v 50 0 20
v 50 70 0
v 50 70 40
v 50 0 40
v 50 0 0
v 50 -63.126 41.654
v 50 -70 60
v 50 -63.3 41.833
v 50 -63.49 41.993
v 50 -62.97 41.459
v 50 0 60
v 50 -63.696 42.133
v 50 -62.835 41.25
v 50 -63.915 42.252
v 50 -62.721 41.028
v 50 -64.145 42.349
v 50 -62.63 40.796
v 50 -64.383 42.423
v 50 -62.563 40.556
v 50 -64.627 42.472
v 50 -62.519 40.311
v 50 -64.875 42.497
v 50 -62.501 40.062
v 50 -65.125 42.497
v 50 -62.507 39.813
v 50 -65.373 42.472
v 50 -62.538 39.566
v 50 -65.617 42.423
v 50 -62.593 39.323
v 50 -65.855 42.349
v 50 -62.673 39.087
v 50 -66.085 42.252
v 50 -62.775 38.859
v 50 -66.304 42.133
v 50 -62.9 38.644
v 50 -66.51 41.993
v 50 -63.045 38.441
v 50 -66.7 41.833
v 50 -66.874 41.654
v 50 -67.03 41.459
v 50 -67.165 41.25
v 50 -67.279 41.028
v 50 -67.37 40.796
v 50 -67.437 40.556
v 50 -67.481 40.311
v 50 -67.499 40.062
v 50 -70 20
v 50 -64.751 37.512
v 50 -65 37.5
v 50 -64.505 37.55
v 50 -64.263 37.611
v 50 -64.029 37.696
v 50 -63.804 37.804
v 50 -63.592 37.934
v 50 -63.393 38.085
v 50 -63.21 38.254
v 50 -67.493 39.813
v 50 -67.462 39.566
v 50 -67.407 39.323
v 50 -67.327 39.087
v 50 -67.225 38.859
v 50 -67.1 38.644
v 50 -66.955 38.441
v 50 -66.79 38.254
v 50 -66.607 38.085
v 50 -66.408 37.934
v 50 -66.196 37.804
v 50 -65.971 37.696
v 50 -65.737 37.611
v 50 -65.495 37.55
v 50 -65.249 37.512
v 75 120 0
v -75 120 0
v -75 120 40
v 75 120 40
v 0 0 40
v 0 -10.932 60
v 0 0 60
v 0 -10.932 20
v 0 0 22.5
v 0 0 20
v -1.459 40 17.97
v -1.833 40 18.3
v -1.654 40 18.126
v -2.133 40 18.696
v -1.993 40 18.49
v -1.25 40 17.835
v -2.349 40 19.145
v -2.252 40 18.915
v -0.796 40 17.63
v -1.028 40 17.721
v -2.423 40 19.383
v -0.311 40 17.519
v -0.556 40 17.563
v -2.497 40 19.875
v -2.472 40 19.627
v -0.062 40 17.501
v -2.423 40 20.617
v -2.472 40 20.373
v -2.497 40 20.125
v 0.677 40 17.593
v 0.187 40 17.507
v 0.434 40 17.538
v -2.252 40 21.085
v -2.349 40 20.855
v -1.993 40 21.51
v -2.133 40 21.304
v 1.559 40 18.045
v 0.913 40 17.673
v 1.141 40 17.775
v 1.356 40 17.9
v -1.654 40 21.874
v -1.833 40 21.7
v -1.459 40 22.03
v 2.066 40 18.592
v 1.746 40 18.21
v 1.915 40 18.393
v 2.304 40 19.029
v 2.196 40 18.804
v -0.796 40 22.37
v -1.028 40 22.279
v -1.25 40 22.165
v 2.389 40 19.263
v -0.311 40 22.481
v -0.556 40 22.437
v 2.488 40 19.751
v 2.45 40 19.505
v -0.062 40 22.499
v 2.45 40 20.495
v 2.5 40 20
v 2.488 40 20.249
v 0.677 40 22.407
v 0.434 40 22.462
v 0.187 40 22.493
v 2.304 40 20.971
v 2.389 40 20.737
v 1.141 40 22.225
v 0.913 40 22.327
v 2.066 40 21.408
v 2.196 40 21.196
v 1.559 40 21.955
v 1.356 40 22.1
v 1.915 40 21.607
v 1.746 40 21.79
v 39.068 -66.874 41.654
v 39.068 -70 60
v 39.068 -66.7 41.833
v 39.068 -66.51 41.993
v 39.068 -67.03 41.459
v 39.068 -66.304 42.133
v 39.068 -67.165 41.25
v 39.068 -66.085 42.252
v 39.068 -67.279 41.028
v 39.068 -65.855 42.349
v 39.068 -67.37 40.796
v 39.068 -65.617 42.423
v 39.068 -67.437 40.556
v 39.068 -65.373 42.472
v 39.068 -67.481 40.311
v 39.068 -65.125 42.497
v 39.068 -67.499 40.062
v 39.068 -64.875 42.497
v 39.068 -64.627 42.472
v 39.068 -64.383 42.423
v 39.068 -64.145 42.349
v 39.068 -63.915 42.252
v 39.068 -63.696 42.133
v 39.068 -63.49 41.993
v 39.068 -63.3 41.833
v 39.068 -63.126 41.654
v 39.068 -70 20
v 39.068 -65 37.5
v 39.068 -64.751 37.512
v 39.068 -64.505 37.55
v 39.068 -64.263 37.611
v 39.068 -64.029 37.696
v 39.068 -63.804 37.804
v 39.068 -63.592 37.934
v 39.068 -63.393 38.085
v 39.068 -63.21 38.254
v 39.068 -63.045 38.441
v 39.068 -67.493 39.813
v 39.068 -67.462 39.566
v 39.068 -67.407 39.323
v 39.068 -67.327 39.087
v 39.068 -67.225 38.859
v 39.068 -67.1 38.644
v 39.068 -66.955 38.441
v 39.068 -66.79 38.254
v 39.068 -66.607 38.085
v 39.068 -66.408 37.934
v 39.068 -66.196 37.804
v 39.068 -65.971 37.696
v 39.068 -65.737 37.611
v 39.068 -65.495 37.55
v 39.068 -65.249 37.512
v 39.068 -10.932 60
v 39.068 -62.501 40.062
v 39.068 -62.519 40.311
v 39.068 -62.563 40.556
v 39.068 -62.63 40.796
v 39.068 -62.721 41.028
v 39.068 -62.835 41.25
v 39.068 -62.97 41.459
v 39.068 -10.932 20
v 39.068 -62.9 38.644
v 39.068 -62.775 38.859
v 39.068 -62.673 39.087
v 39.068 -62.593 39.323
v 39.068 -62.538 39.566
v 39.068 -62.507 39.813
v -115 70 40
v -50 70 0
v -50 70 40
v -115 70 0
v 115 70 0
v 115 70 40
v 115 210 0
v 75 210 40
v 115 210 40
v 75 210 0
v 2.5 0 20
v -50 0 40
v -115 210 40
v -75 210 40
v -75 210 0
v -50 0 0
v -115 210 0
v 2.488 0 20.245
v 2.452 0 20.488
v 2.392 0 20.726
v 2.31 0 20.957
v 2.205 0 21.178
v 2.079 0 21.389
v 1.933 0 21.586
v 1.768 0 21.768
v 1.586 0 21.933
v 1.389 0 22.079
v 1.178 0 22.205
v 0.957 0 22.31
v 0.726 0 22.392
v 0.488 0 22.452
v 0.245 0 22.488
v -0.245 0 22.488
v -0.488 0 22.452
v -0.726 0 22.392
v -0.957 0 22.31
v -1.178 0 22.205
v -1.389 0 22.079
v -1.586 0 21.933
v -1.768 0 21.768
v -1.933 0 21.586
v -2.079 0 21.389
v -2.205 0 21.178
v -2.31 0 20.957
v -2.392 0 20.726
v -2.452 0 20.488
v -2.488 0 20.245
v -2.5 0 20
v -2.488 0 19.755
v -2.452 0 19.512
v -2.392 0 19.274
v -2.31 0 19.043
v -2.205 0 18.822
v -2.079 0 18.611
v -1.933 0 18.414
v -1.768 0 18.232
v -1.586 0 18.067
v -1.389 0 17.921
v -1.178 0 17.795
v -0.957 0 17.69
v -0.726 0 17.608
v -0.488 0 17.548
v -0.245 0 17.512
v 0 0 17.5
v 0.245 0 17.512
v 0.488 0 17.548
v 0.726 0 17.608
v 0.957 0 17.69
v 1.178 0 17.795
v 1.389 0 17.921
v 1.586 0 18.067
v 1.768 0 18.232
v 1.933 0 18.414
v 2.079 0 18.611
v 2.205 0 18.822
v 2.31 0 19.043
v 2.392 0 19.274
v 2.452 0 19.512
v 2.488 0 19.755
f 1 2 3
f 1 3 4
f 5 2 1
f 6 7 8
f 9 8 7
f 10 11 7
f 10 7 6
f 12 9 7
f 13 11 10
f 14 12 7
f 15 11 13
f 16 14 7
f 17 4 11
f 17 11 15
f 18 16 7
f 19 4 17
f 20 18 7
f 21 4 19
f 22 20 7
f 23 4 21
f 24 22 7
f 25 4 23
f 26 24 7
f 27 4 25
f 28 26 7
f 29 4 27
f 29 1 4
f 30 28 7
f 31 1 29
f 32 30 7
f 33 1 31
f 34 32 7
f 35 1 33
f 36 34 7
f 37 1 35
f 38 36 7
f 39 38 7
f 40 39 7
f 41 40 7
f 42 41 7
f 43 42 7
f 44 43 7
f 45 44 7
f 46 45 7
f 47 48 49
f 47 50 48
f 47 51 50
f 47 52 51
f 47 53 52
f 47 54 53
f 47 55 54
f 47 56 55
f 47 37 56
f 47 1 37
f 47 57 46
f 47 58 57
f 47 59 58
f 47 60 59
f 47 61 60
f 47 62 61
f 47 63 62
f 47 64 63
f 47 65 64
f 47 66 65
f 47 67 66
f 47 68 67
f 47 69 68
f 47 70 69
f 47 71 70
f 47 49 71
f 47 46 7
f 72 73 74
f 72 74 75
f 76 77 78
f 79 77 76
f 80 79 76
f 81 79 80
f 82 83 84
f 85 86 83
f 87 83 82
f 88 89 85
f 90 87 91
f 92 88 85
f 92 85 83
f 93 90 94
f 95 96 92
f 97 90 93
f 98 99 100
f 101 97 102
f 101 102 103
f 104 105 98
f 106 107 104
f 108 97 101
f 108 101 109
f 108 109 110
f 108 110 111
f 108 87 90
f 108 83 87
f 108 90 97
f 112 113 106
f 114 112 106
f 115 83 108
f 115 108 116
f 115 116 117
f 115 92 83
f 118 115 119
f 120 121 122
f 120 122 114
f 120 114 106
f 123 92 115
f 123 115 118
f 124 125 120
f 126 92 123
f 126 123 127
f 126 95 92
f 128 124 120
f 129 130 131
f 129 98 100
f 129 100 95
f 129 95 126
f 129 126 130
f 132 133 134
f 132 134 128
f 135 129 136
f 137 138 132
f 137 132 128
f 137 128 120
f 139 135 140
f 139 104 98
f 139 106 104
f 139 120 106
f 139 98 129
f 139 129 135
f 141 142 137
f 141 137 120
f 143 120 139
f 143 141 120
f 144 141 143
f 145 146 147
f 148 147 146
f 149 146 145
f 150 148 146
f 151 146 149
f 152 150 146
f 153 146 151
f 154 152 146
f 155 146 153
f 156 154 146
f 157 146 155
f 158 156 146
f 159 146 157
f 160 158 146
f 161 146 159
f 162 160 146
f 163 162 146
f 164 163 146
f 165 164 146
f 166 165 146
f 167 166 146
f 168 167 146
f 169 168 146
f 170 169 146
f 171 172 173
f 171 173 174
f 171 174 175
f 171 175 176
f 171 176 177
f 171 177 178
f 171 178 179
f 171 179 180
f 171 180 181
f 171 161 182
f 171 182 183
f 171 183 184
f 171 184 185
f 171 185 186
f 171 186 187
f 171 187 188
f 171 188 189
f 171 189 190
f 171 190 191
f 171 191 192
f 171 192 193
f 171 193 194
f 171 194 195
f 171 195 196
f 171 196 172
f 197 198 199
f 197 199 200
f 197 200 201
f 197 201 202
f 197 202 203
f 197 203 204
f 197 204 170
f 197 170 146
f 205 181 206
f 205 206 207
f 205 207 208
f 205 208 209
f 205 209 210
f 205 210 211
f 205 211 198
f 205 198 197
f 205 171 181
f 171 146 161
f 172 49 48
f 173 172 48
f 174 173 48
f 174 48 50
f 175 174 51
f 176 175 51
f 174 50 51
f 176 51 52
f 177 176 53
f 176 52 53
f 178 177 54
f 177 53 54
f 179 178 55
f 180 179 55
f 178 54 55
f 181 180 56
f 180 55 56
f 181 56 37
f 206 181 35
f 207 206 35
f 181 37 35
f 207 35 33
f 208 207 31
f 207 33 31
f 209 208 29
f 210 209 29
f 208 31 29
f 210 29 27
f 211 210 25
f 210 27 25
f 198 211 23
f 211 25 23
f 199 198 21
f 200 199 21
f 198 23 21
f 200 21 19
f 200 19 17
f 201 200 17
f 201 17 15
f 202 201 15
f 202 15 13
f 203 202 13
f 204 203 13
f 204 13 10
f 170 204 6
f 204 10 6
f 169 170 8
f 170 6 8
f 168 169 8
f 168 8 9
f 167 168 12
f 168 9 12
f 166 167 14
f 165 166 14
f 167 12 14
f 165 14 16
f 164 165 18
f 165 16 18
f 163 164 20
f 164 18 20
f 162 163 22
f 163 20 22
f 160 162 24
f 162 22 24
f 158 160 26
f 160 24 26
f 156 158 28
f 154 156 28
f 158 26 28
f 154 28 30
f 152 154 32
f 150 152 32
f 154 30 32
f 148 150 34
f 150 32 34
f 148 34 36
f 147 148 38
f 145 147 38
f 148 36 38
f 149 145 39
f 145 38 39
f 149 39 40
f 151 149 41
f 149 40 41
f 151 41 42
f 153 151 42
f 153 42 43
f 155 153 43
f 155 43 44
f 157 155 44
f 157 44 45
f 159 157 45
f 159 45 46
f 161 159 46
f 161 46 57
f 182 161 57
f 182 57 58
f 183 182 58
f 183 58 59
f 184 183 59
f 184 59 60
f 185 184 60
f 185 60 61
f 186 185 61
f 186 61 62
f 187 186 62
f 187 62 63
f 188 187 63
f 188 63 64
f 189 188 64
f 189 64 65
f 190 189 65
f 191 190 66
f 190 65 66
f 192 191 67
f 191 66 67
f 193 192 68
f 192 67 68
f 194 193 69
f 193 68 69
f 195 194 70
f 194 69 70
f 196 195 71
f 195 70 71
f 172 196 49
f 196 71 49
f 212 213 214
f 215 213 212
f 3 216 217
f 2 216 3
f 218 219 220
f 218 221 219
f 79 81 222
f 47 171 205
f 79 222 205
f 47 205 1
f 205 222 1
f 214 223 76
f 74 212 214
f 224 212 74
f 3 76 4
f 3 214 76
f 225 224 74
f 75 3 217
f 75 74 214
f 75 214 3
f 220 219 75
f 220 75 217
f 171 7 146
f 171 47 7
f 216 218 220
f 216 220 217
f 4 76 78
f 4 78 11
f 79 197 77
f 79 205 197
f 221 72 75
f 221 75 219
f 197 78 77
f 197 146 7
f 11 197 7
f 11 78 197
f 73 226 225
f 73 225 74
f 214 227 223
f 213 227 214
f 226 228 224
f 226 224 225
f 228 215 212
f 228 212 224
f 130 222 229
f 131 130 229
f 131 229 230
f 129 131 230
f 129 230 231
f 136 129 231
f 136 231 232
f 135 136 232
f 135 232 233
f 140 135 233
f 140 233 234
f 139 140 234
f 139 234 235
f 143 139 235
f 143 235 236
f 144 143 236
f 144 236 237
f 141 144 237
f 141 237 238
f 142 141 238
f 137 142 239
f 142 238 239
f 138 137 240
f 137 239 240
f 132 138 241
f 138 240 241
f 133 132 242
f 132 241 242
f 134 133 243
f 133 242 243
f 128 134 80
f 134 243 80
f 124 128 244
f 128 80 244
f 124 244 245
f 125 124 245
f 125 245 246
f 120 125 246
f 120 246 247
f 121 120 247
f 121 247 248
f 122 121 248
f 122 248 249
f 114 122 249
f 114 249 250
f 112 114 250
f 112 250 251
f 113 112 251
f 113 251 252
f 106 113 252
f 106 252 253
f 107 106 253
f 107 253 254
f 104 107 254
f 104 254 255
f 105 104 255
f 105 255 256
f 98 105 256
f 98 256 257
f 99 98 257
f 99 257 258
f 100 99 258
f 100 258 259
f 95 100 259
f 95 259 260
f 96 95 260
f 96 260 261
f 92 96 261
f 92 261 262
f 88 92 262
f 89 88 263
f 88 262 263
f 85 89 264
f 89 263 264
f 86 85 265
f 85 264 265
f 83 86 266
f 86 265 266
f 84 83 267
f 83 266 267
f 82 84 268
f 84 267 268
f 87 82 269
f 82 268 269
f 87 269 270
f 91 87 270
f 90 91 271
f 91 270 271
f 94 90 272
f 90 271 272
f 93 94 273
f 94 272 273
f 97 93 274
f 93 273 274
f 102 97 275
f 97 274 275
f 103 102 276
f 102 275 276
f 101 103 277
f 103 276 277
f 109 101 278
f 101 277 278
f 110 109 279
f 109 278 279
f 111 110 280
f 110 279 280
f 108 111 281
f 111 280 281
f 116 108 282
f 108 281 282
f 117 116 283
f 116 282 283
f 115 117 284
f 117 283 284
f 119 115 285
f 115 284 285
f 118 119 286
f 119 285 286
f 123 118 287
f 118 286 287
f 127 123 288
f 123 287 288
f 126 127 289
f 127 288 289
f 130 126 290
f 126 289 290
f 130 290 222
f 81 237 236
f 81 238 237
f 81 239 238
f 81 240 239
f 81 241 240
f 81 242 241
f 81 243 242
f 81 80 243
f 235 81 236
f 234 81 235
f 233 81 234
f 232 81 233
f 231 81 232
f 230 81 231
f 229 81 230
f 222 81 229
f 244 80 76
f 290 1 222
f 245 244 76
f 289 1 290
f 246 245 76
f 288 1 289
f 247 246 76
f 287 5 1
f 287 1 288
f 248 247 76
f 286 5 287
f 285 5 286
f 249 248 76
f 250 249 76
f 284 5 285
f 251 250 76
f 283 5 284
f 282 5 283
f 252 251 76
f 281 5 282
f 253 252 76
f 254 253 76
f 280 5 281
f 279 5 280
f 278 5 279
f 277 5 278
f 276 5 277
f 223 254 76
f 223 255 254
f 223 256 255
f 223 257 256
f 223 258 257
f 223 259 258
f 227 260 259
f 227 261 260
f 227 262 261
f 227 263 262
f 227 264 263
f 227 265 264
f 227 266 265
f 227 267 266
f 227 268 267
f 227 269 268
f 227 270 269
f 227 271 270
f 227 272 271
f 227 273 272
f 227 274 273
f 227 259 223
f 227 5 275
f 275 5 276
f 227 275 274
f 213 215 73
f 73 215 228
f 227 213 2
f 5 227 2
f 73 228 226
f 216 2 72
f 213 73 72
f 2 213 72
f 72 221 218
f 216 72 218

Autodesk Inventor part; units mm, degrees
ref_plane "YZ Plane" through (0, 0, 0) normal (1, 0, 0) x (0, 1, 0)
ref_plane "XZ Plane" through (0, 0, 0) normal (0, 1, 0) x (-1, 0, 0)
sketch "Sketch1" plane through (0, 0, 0) normal (0, 0, 1) x (1, 0, 0)
  line L0 (-50, 0) -> (-50, 70)
  line L1 (-50, 70) -> (-115, 70)
  line L2 (-115, 70) -> (-115, 210)
  line L3 (-115, 210) -> (-75, 210)
  line L4 (-75, 210) -> (-75, 120)
  line L5 (-75, 120) -> (75, 120)
  line L6 (75, 120) -> (75, 210)
  line L7 (75, 210) -> (115, 210)
  line L8 (115, 210) -> (115, 70)
  line L9 (115, 70) -> (50, 70)
  line L10 (50, 70) -> (50, 0)
  line L11 (50, 0) -> (-50, 0)
  point P0 (0, 0)
  point P1 (0, 120)
  point P2 (0, 0)
  dimension "d0" = 100
  dimension "d1" = 150
  dimension "d2" = 40
  dimension "d3" = 140
  dimension "d4" = 90
  dimension "d5" = 70
extrude "Extrusion1" add sketch "Sketch1" along normal blind 40
sketch "Sketch2" plane through (-50, 0, 0) normal (0, -1, 0) x (1, 0, 0)
  line L0 (0, 0) -> (0, 40) projected
  line L1 (100, 0) -> (100, 40) projected
  line L2 (0, 40) -> (100, 40) projected
  circle A0 centre (50, 20) radius 2.5
  point P0 (50, 0)
  dimension "d8" = 5
extrude "Extrusion2" cut sketch "Sketch2" against normal blind 40
ref_plane "Work Plane1" through (0, 0, 20) normal (0, 0, 1) x (1, 0, 0)
sketch "Sketch3" plane through (0, 0, 20) normal (0, 0, 1) x (1, 0, 0)
  line L0 (-50, 0) -> (50, 0) projected
  line L1 (0, 0) -> (50, 0)
  line L2 (50, 0) -> (50, -70)
  line L3 (50, -70) -> (39.0685, -70)
  line L4 (39.0685, -70) -> (39.0685, -10.9315)
  line L5 (39.0685, -10.9315) -> (0, -10.9315)
  line L6 (0, -10.9315) -> (0, 0)
  dimension "d12" = 70
  dimension "d13" = 39.0685
extrude "Extrusion3" add sketch "Sketch3" along normal blind 40
sketch "Sketch4" plane through (50, 0, 0) normal (1, 0, 0) x (0, 0, -1)
  circle A0 centre (-40, -65) radius 2.5
  line L0 (-20, -70) -> (-60, -70) projected
  point P0 (0, 0)
  point P1 (-40, -70)
  point P2 (-40, -70)
  dimension "d16" = 5
  dimension "d17" = 5
extrude "Extrusion4" cut sketch "Sketch4" against normal blind 40
properties part number "Robot_arm_gripper"
